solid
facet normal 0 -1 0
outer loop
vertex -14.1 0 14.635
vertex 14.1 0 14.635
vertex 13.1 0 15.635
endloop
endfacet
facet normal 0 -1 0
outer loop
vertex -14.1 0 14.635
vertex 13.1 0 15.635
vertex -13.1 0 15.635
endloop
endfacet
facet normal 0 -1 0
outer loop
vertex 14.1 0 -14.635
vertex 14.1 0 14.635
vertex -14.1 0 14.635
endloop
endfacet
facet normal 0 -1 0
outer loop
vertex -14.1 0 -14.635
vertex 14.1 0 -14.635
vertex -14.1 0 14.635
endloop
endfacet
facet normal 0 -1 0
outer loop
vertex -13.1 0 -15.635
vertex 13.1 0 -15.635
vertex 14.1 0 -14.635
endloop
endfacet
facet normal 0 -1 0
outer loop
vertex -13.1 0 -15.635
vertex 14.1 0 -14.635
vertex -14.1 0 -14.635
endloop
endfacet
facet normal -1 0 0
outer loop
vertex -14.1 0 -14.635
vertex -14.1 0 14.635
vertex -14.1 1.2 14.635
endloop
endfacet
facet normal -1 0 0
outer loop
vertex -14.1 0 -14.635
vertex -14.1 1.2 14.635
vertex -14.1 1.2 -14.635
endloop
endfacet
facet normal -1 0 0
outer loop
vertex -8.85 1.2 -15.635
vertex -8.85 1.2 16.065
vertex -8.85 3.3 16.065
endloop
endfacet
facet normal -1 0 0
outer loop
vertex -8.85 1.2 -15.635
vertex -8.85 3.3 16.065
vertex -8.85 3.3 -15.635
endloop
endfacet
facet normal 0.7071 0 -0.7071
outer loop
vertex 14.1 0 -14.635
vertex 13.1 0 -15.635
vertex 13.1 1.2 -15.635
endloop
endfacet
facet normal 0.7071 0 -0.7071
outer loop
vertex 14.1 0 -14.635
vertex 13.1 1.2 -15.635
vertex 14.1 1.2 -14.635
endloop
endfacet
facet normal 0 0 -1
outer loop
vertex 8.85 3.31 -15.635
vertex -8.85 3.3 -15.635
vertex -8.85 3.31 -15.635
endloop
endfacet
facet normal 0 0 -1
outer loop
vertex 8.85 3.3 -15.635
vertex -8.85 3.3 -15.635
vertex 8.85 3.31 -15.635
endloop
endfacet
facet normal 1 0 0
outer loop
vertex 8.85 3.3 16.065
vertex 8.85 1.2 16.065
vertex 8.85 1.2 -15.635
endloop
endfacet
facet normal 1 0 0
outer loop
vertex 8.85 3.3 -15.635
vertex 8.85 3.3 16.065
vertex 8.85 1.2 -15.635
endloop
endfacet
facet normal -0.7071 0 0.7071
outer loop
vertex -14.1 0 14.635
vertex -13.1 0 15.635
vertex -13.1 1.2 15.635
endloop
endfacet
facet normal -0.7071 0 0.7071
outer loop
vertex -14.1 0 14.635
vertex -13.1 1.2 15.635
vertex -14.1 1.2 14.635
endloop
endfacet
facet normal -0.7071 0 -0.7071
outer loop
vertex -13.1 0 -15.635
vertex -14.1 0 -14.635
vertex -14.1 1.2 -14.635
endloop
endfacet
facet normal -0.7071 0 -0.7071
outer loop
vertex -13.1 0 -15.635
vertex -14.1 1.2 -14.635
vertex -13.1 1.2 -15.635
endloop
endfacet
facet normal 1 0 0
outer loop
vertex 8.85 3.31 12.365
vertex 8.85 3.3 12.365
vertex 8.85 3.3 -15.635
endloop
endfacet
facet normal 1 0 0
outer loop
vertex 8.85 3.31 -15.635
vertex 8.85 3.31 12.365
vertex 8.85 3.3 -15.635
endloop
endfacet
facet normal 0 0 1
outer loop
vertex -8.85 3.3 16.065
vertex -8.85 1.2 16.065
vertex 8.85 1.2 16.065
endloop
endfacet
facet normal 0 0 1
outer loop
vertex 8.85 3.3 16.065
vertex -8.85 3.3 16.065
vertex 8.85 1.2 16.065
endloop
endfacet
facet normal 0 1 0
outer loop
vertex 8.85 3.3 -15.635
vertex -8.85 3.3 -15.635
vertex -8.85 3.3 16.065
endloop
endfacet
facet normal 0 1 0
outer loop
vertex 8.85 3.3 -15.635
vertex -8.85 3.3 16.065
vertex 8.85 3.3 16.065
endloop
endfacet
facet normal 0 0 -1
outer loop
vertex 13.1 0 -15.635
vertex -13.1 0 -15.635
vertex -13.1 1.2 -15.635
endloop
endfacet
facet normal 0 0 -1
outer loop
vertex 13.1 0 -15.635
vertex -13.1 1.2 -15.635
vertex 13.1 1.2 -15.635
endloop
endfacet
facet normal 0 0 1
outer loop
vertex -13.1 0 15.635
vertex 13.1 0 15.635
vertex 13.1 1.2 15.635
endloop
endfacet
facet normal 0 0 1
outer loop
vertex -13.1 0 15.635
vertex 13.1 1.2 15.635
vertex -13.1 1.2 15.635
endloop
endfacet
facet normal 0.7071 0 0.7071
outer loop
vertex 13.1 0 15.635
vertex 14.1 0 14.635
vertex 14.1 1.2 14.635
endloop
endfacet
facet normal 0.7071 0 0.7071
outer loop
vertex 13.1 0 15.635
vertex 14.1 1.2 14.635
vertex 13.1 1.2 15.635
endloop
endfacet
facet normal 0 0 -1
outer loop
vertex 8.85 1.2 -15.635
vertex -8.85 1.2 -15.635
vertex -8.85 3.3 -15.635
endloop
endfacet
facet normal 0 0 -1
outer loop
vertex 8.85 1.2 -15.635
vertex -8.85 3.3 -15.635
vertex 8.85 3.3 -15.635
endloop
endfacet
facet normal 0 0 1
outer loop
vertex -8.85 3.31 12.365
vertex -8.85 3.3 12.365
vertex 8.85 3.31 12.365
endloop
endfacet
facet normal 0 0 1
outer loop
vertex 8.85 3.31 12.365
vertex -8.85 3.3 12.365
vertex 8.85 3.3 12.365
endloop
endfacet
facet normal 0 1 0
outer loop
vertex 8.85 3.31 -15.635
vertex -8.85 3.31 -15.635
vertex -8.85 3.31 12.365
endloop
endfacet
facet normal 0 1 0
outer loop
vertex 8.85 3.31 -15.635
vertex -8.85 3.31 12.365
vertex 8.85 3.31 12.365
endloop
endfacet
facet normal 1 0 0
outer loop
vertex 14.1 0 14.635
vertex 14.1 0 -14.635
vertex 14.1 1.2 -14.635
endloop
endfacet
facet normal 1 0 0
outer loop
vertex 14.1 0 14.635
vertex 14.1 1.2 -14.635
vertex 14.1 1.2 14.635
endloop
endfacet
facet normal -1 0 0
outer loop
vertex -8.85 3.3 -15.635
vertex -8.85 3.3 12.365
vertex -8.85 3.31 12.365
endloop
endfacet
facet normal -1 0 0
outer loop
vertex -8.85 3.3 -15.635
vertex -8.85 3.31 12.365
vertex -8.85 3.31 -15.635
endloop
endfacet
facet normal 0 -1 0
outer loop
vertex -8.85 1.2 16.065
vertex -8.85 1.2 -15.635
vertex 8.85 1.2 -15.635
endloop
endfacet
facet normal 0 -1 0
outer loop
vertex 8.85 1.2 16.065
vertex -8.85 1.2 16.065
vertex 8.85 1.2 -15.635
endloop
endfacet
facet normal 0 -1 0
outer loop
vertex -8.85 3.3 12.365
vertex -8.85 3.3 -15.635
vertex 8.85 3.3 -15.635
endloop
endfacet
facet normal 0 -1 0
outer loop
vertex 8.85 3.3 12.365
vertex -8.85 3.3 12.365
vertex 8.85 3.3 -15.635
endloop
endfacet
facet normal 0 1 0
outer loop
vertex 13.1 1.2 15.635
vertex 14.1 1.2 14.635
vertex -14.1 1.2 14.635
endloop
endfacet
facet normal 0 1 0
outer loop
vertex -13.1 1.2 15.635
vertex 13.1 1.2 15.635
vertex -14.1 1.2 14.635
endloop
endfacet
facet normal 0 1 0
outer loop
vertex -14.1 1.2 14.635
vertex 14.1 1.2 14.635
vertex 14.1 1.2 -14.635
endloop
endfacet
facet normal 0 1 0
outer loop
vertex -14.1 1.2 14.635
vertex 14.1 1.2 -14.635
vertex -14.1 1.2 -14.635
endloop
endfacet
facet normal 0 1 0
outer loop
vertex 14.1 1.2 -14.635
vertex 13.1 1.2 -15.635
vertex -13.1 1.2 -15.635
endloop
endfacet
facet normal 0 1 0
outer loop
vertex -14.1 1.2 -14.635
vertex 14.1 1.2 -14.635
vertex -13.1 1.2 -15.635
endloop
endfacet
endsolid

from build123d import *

# Parameters (mm, degrees)
EXTRUDE_1_DEPTH = 1.2
SKETCH_2_W      = 17.7
SKETCH_2_H      = 31.7
EXTRUDE_2_DEPTH = 2.1
SKETCH_3_W      = 17.7
SKETCH_3_H      = 28
EXTRUDE_3_DEPTH = 0.01


with BuildPart() as part:
    # Эскиз1 → Бобышка-Вытянуть1 (new body)
    with BuildSketch(Plane(origin=(0, 0, 0), x_dir=(1, 0, 0), z_dir=(0, 1, 0))):
        Polygon((-14.1, 14.635), (-13.1, 15.635), (13.1, 15.635), (14.1, 14.635), (14.1, -14.635), (13.1, -15.635), (-13.1, -15.635), (-14.1, -14.635), align=None)
    extrude(amount=EXTRUDE_1_DEPTH)


with BuildPart() as body_2:
    # Эскиз2 → Бобышка-Вытянуть2 (new body)
    with BuildSketch(Plane(origin=(0, 1.2, 0), x_dir=(1, 0, 0), z_dir=(0, 1, 0))):
        with Locations((0, -0.215)):
            Rectangle(SKETCH_2_W, SKETCH_2_H)
    extrude(amount=EXTRUDE_2_DEPTH)


with BuildPart() as body_3:
    # Эскиз3 → Бобышка-Вытянуть3 (new body)
    with BuildSketch(Plane(origin=(0, 3.3, 0), x_dir=(1, 0, 0), z_dir=(0, 1, 0))):
        with Locations((0, 1.635)):
            Rectangle(SKETCH_3_W, SKETCH_3_H)
    extrude(amount=EXTRUDE_3_DEPTH)


solid = Compound([part.part, body_2.part, body_3.part])
